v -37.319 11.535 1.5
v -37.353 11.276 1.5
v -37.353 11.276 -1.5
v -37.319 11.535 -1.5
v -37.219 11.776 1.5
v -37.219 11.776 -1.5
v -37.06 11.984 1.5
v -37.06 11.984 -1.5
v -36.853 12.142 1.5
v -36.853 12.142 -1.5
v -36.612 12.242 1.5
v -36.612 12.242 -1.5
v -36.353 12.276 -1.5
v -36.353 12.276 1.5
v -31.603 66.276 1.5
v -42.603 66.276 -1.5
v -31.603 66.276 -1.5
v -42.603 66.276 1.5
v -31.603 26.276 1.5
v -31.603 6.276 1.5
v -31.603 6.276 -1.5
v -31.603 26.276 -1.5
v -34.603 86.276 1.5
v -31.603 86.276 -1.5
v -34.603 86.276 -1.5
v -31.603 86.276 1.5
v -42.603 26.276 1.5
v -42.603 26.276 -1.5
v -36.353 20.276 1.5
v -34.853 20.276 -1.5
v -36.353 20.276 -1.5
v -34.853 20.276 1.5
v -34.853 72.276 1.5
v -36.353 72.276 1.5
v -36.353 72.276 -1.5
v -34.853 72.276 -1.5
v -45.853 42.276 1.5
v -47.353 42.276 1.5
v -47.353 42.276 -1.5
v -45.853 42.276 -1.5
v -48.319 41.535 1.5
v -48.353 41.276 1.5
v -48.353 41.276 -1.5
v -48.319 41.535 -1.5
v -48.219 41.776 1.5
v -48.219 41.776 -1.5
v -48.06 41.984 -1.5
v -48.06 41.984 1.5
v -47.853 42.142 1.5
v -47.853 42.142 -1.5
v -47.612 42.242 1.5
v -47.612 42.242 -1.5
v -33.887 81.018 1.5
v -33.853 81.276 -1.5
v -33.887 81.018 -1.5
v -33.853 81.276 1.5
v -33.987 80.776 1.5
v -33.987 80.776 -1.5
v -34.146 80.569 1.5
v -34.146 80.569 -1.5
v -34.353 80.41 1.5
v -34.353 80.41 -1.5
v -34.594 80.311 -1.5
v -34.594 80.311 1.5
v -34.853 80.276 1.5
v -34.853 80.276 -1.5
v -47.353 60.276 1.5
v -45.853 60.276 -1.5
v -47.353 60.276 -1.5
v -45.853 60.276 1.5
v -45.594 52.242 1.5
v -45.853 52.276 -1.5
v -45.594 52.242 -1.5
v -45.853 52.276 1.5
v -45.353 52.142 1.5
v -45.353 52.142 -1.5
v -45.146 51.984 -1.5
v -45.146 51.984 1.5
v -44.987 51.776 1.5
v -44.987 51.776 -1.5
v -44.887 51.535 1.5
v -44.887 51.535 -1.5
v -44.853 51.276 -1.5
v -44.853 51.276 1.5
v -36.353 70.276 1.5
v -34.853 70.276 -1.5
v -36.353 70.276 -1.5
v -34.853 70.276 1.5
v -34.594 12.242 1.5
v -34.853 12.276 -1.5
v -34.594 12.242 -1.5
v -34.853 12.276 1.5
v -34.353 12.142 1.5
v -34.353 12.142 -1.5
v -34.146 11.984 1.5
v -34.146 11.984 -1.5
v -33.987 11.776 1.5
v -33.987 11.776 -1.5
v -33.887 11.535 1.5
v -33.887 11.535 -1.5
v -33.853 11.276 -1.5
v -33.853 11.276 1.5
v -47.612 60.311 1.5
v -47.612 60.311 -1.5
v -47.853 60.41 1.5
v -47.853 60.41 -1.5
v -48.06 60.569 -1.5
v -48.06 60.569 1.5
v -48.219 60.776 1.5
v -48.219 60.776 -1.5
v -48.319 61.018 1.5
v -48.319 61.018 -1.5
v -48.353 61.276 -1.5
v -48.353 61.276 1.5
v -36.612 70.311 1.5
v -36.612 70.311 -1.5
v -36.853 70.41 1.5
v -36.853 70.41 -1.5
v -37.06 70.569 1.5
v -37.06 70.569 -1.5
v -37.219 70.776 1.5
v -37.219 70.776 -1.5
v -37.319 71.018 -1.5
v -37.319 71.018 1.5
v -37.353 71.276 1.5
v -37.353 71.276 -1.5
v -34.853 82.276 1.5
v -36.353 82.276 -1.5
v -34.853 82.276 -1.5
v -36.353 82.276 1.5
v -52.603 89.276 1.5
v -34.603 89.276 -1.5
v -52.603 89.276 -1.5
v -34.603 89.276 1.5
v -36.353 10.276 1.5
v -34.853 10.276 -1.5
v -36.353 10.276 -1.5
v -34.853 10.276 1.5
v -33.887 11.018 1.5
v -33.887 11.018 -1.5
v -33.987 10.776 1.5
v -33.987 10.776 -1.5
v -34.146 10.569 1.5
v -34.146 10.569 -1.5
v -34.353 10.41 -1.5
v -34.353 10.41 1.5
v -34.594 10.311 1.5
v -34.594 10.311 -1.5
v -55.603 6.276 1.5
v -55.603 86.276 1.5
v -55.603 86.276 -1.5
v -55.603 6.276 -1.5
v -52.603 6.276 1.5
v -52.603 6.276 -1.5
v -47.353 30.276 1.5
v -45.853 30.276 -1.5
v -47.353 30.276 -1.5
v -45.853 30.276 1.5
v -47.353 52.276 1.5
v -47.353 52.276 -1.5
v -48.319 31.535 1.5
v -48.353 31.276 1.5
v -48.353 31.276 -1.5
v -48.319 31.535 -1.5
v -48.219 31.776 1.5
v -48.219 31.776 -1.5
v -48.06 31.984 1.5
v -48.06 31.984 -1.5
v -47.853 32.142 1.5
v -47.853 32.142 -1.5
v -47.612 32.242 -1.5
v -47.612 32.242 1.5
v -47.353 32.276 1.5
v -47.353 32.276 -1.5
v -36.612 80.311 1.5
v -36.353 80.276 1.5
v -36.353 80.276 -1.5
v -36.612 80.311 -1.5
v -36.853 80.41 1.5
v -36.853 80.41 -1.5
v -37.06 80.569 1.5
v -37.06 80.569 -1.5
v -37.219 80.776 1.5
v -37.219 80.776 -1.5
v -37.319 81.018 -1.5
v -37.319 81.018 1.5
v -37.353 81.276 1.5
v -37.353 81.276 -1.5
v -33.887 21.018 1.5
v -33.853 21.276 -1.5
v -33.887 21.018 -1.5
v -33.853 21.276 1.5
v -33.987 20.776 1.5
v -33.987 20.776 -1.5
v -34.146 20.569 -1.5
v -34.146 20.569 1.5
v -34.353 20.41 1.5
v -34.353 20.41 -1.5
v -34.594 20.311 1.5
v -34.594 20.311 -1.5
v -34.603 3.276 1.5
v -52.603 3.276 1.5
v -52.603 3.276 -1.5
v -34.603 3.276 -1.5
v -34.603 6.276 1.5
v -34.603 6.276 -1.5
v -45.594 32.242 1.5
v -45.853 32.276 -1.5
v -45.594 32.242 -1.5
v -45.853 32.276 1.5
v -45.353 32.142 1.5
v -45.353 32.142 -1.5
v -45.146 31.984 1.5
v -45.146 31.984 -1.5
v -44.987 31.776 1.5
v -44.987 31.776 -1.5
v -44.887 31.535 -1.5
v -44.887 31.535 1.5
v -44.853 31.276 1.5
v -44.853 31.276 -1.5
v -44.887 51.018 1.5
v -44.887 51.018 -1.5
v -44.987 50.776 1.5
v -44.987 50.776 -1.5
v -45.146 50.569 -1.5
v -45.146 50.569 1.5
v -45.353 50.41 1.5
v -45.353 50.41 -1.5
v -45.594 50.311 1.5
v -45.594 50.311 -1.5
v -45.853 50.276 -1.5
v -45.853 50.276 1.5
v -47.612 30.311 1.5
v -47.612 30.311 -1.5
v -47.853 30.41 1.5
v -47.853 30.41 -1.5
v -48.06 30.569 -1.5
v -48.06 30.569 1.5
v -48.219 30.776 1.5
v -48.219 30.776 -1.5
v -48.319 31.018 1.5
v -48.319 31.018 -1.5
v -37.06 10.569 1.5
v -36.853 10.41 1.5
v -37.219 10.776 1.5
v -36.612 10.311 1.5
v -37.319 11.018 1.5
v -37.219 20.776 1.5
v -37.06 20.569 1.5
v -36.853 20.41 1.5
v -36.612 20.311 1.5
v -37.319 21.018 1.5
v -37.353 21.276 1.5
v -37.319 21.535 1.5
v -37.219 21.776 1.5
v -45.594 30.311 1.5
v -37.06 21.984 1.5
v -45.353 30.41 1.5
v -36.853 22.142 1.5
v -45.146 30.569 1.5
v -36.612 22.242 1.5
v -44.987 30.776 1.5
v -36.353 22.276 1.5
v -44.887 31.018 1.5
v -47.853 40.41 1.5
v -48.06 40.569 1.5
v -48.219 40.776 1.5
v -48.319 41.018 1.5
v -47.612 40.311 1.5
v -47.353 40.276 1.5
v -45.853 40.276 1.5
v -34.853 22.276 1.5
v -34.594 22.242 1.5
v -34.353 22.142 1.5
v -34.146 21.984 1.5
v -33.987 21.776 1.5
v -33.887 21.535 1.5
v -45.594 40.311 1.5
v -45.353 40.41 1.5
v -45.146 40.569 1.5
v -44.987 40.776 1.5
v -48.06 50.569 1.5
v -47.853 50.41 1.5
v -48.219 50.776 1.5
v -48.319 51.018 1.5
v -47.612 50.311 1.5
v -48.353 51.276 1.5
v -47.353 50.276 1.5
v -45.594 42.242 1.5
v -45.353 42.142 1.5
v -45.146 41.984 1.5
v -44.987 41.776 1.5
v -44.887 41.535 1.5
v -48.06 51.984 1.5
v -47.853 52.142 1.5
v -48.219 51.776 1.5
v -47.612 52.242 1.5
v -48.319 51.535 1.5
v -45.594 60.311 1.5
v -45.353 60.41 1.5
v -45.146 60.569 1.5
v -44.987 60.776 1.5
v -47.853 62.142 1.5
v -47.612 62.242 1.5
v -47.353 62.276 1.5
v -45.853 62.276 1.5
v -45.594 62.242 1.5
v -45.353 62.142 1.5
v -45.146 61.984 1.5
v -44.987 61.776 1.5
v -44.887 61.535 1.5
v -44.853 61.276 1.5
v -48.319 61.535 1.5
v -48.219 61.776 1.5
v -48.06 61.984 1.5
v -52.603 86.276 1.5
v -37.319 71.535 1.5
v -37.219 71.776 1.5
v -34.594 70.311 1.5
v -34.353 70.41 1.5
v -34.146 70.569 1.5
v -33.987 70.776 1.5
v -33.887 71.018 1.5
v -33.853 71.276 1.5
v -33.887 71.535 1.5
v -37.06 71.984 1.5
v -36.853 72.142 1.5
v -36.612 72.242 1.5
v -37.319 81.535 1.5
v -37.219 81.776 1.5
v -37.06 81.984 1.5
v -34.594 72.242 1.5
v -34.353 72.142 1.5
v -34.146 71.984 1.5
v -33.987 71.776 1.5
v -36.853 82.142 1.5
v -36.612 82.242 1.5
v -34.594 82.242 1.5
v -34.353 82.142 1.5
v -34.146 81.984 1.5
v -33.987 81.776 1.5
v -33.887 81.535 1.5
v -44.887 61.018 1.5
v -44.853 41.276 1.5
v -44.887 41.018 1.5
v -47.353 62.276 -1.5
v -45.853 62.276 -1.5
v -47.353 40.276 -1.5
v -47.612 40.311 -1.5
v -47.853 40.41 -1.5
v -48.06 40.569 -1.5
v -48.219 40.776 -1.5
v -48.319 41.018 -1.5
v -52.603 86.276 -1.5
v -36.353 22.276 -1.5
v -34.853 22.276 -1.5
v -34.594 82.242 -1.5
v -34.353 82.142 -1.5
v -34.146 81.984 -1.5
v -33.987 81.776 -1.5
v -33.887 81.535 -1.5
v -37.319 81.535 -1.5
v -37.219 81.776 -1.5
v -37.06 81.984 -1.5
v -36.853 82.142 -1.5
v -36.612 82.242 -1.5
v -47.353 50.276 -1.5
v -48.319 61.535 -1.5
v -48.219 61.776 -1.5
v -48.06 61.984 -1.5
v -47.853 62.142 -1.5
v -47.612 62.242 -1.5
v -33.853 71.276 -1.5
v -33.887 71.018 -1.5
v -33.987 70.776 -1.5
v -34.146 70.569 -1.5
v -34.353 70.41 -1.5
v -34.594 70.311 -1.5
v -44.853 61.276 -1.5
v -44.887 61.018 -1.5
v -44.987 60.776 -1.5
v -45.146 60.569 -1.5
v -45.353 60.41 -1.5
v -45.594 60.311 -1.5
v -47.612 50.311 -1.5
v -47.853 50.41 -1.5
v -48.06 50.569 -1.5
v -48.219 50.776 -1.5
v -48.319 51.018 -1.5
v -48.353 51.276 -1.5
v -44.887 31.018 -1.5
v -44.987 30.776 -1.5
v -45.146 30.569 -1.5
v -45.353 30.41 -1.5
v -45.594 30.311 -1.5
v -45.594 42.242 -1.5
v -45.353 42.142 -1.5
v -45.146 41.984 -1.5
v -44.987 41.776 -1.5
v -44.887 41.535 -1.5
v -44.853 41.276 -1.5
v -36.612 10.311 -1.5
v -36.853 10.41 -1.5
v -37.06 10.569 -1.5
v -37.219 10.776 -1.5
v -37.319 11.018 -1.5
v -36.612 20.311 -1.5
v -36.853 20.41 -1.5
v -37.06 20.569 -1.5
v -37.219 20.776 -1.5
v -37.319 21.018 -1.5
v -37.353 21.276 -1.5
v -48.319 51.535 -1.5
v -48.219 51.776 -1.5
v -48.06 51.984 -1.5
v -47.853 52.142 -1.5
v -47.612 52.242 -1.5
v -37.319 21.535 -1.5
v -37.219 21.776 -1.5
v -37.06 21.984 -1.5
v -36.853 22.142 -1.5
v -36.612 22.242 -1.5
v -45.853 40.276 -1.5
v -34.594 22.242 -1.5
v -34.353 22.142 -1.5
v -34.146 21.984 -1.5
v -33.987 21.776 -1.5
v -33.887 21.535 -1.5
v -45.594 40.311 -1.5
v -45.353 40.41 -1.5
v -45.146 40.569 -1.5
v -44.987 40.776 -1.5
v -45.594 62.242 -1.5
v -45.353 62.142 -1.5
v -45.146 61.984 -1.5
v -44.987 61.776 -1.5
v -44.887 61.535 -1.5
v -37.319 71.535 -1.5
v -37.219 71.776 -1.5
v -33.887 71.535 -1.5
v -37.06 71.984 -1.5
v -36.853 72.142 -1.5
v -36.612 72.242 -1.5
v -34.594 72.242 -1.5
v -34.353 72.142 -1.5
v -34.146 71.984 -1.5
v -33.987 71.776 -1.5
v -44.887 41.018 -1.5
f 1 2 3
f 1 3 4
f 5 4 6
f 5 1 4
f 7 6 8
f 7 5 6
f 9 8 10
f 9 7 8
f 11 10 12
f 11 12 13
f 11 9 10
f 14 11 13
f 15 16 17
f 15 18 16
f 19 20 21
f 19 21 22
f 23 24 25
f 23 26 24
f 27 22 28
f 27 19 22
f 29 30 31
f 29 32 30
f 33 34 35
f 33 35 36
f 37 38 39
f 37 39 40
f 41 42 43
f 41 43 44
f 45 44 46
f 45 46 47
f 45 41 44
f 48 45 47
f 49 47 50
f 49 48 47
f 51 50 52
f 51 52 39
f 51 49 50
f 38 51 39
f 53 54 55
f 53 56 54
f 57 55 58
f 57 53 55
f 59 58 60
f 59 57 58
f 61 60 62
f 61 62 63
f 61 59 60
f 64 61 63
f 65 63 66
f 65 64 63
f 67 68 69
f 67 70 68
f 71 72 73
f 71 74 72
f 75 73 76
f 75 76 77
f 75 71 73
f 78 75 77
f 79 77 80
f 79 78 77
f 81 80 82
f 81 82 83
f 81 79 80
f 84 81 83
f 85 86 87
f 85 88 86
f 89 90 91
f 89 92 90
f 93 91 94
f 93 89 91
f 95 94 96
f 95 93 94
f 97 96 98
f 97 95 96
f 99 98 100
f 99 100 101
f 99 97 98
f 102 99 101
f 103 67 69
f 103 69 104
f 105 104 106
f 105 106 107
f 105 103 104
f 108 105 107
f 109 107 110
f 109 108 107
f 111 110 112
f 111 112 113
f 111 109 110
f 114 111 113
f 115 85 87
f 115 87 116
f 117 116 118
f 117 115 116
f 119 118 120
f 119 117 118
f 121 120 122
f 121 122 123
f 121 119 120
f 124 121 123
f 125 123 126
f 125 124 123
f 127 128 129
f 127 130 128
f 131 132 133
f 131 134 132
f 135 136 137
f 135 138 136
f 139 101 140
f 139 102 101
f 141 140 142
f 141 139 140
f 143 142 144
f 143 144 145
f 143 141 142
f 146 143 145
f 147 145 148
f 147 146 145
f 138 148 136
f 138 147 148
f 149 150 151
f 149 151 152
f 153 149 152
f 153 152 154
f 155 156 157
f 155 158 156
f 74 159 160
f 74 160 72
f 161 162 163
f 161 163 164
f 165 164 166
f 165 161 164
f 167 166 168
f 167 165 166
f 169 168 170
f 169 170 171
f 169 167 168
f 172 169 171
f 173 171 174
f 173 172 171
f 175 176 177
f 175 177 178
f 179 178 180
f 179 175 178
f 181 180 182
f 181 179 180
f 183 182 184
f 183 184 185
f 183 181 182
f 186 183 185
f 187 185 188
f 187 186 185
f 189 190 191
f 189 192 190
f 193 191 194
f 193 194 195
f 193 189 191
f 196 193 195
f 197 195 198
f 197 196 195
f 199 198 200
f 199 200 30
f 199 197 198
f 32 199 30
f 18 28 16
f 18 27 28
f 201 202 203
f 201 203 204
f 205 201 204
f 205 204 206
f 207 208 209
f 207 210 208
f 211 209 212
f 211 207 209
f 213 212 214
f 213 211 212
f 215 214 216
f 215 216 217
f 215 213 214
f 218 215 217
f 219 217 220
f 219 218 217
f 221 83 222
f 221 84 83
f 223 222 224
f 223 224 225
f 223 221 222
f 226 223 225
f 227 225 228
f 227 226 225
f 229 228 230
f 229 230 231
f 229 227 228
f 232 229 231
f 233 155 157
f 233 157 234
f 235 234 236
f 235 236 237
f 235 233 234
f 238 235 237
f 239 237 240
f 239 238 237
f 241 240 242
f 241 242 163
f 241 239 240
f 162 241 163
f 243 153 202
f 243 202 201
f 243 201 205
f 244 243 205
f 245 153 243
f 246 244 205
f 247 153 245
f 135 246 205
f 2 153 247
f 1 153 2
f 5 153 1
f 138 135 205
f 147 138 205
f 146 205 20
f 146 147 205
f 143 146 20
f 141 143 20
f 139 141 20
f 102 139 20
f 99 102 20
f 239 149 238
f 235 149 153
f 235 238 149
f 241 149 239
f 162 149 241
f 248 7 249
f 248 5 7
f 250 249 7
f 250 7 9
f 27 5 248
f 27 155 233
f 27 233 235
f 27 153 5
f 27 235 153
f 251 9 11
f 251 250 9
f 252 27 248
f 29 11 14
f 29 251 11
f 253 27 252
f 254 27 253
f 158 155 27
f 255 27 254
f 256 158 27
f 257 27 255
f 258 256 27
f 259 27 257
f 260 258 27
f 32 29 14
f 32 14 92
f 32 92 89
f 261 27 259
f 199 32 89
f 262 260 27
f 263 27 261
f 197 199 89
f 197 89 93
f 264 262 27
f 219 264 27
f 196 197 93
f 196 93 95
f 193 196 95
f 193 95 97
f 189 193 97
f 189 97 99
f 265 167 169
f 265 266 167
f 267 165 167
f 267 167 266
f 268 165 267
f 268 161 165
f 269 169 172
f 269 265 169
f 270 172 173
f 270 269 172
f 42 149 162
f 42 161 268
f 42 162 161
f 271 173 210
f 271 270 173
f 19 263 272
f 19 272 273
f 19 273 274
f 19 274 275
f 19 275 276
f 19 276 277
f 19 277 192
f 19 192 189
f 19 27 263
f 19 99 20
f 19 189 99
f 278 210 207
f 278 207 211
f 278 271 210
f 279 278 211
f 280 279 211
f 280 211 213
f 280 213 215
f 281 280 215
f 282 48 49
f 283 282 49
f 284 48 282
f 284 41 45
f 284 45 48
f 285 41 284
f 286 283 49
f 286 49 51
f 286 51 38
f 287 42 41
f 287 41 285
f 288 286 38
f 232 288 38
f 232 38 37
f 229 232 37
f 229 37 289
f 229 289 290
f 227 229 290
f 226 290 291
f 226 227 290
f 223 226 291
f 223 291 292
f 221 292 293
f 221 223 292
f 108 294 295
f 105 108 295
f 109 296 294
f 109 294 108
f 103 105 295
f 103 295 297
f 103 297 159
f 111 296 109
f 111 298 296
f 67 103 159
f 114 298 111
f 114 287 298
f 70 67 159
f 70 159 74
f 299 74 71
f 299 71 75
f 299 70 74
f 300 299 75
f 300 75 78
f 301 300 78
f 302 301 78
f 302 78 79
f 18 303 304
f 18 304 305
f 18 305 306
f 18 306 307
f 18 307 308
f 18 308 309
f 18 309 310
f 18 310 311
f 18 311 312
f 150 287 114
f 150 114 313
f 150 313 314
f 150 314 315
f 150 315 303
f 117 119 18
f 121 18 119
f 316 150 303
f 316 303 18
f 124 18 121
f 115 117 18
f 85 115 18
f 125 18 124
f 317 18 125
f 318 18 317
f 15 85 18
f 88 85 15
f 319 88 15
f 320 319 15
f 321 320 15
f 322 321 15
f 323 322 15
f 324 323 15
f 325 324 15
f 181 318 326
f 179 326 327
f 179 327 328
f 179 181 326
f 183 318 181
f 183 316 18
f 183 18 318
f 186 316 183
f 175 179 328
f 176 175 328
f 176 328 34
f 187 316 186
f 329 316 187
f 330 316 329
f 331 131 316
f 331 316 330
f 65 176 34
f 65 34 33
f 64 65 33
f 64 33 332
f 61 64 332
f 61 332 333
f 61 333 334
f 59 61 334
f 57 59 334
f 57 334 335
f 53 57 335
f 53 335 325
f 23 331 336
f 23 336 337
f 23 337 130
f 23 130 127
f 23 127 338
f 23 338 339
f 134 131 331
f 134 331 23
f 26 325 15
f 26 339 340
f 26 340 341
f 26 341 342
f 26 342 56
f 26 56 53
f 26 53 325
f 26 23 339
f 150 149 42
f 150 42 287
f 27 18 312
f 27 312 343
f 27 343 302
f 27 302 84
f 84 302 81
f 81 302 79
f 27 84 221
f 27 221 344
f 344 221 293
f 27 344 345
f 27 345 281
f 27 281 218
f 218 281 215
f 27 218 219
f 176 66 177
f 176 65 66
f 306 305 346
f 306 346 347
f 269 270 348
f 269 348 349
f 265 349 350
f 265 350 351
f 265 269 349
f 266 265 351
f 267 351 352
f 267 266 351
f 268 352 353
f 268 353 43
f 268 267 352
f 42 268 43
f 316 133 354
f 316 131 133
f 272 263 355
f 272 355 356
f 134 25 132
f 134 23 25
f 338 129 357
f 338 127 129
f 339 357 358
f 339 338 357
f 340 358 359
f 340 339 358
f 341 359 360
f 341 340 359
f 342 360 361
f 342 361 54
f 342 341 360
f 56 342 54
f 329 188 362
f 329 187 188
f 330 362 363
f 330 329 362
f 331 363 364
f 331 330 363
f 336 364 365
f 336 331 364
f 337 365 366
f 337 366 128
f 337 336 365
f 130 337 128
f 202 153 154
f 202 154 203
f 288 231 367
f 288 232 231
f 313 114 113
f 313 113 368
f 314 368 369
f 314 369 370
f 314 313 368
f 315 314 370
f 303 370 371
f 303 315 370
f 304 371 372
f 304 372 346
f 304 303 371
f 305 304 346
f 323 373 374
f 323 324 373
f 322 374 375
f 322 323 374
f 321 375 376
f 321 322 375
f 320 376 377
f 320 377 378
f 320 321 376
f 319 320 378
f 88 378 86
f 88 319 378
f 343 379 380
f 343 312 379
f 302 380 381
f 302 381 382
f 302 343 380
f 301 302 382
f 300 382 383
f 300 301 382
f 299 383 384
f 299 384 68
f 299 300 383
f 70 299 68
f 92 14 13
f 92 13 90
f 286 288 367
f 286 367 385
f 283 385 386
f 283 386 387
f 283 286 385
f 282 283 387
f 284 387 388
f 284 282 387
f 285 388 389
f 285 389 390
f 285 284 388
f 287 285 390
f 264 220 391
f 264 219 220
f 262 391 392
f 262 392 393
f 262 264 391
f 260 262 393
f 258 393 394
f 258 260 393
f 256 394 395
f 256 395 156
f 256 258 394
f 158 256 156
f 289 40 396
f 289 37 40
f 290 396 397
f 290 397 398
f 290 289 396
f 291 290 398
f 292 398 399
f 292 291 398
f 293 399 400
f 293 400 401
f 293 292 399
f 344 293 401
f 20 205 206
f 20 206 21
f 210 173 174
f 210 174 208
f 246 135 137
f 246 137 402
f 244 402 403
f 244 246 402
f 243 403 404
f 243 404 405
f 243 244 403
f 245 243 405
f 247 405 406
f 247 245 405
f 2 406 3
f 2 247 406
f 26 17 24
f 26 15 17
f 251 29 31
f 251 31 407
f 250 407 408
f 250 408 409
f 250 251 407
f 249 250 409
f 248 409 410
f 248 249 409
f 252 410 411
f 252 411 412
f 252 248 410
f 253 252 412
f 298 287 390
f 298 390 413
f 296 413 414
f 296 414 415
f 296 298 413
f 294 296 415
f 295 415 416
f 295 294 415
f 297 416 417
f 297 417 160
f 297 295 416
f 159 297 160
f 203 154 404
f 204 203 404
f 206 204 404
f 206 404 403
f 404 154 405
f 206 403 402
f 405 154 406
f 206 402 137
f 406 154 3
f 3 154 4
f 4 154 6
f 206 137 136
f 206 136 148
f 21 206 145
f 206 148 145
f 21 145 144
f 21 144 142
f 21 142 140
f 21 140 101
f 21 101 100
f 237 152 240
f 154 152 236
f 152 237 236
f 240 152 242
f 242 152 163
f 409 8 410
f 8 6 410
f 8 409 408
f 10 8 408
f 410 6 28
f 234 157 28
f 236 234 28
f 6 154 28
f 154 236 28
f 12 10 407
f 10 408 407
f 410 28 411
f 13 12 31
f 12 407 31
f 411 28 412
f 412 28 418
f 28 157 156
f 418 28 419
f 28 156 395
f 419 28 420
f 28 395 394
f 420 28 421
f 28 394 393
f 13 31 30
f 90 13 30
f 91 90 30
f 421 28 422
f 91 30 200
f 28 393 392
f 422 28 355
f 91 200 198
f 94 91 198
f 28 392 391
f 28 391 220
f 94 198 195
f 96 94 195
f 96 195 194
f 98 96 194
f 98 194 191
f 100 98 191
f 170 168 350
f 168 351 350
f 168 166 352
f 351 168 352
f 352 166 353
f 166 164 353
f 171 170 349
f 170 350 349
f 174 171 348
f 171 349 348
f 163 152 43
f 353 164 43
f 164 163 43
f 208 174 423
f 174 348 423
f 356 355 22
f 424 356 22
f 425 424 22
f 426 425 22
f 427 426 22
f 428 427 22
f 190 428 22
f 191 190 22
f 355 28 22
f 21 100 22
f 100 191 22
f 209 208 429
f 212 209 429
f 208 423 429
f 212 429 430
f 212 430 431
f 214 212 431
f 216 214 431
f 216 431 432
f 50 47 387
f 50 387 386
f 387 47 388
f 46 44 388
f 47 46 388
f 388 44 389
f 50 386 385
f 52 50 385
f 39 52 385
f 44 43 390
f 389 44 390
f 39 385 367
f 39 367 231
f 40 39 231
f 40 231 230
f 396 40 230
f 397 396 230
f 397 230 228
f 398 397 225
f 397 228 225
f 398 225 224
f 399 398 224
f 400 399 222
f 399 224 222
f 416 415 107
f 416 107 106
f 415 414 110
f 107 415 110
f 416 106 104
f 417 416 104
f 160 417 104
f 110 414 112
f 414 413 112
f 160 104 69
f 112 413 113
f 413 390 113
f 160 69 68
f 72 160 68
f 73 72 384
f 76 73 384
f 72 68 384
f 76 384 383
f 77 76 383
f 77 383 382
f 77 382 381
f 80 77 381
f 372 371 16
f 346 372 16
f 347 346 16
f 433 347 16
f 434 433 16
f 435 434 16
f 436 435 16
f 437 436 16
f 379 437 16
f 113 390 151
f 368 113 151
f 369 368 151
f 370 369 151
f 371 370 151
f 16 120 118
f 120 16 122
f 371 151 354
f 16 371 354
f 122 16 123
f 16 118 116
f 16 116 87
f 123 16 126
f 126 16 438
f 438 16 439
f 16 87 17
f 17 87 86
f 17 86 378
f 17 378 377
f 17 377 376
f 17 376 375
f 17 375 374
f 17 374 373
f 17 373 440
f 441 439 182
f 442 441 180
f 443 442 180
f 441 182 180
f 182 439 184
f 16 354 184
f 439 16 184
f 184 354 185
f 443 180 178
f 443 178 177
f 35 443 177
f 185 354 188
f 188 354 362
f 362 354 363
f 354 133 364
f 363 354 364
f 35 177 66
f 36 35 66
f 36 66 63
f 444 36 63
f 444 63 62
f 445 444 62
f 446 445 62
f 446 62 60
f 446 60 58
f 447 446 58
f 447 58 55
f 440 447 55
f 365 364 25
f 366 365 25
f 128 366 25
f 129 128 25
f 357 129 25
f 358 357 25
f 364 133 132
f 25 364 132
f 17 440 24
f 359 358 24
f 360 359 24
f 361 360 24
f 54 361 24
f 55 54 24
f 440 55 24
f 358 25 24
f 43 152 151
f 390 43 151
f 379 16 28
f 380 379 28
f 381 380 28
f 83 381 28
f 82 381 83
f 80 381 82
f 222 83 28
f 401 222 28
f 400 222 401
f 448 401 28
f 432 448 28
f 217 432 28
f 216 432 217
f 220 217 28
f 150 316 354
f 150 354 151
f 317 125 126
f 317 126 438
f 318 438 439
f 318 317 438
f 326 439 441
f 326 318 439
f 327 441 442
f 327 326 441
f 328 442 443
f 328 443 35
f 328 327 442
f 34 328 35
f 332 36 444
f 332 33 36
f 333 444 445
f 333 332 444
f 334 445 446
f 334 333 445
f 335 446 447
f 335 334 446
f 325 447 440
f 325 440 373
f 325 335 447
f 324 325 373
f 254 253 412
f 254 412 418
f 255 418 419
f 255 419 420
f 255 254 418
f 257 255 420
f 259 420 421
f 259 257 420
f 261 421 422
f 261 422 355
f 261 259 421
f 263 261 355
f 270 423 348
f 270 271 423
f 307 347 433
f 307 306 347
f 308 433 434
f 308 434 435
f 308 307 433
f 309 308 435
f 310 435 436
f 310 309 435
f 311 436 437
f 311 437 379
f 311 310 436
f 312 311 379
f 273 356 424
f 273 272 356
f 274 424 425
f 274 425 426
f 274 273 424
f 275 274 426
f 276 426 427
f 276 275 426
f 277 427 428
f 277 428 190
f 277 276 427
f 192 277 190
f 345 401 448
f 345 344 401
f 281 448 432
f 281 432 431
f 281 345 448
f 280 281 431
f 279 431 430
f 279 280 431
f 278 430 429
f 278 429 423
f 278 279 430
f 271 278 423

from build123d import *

# Parameters (mm, degrees)
F1_DEPTH = 1.5


with BuildPart() as f1:
    # F0 (on Top) → F1 (new body, symmetric)
    with BuildSketch(Plane.XY):
        Polygon((-52.603185, 89.276404), (-52.603174, 86.276474), (-55.603174, 86.276415), (-55.603174, 6.276474), (-52.603185, 6.276474), (-52.603185, 3.276485), (-34.603174, 3.276474), (-34.603174, 6.276474), (-31.603174, 6.276474), (-31.603174, 26.276474), (-42.603279, 26.276459), (-42.603279, 66.27643), (-31.603261, 66.27643), (-31.603261, 86.276415), (-34.603174, 86.276474), (-34.60325, 89.276404), align=None)
        with BuildLine():
            ThreePointArc((-47.353174, 30.276474), (-48.060281, 30.569367), (-48.353174, 31.276474))
            ThreePointArc((-48.353174, 31.276474), (-48.060281, 31.983581), (-47.353174, 32.276474))
            Line((-47.353174, 32.276474), (-45.853174, 32.276474))
            ThreePointArc((-45.853174, 32.276474), (-45.146067, 31.983581), (-44.853174, 31.276474))
            ThreePointArc((-44.853174, 31.276474), (-45.146067, 30.569367), (-45.853174, 30.276474))
            Line((-45.853174, 30.276474), (-47.353174, 30.276474))
        make_face(mode=Mode.SUBTRACT)
        with BuildLine():
            ThreePointArc((-47.353174, 40.276474), (-48.060281, 40.569367), (-48.353174, 41.276474))
            ThreePointArc((-48.353174, 41.276474), (-48.060281, 41.983581), (-47.353174, 42.276474))
            Line((-47.353174, 42.276474), (-45.853174, 42.276474))
            ThreePointArc((-45.853174, 42.276474), (-45.146067, 41.983581), (-44.853174, 41.276474))
            ThreePointArc((-44.853174, 41.276474), (-45.146067, 40.569367), (-45.853174, 40.276474))
            Line((-45.853174, 40.276474), (-47.353174, 40.276474))
        make_face(mode=Mode.SUBTRACT)
        with BuildLine():
            ThreePointArc((-36.353174, 10.276474), (-37.060281, 10.569367), (-37.353174, 11.276474))
            ThreePointArc((-37.353174, 11.276474), (-37.060281, 11.983581), (-36.353174, 12.276474))
            Line((-36.353174, 12.276474), (-34.853174, 12.276474))
            ThreePointArc((-34.853174, 12.276474), (-34.146067, 11.983581), (-33.853174, 11.276474))
            ThreePointArc((-33.853174, 11.276474), (-34.146067, 10.569367), (-34.853174, 10.276474))
            Line((-34.853174, 10.276474), (-36.353174, 10.276474))
        make_face(mode=Mode.SUBTRACT)
        with BuildLine():
            ThreePointArc((-36.353174, 20.276474), (-37.060281, 20.569367), (-37.353174, 21.276474))
            ThreePointArc((-37.353174, 21.276474), (-37.060281, 21.983581), (-36.353174, 22.276474))
            Line((-36.353174, 22.276474), (-34.853174, 22.276474))
            ThreePointArc((-34.853174, 22.276474), (-34.146067, 21.983581), (-33.853174, 21.276474))
            ThreePointArc((-33.853174, 21.276474), (-34.146067, 20.569367), (-34.853174, 20.276474))
            Line((-34.853174, 20.276474), (-36.353174, 20.276474))
        make_face(mode=Mode.SUBTRACT)
        with BuildLine():
            ThreePointArc((-47.353174, 50.276474), (-48.060281, 50.569367), (-48.353174, 51.276474))
            ThreePointArc((-48.353174, 51.276474), (-48.060281, 51.983581), (-47.353174, 52.276474))
            Line((-47.353174, 52.276474), (-45.853174, 52.276474))
            ThreePointArc((-45.853174, 52.276474), (-45.146067, 51.983581), (-44.853174, 51.276474))
            ThreePointArc((-44.853174, 51.276474), (-45.146067, 50.569367), (-45.853174, 50.276474))
            Line((-45.853174, 50.276474), (-47.353174, 50.276474))
        make_face(mode=Mode.SUBTRACT)
        with BuildLine():
            ThreePointArc((-47.353174, 60.276474), (-48.060281, 60.569367), (-48.353174, 61.276474))
            ThreePointArc((-48.353174, 61.276474), (-48.060281, 61.983581), (-47.353174, 62.276474))
            Line((-47.353174, 62.276474), (-45.853174, 62.276474))
            ThreePointArc((-45.853174, 62.276474), (-45.146067, 61.983581), (-44.853174, 61.276474))
            ThreePointArc((-44.853174, 61.276474), (-45.146067, 60.569367), (-45.853174, 60.276474))
            Line((-45.853174, 60.276474), (-47.353174, 60.276474))
        make_face(mode=Mode.SUBTRACT)
        with BuildLine():
            ThreePointArc((-36.353174, 70.276474), (-37.060281, 70.569367), (-37.353174, 71.276474))
            ThreePointArc((-37.353174, 71.276474), (-37.060281, 71.983581), (-36.353174, 72.276474))
            Line((-36.353174, 72.276474), (-34.853174, 72.276474))
            ThreePointArc((-34.853174, 72.276474), (-34.146067, 71.983581), (-33.853174, 71.276474))
            ThreePointArc((-33.853174, 71.276474), (-34.146067, 70.569367), (-34.853174, 70.276474))
            Line((-34.853174, 70.276474), (-36.353174, 70.276474))
        make_face(mode=Mode.SUBTRACT)
        with BuildLine():
            ThreePointArc((-36.353174, 80.276474), (-37.060281, 80.569367), (-37.353174, 81.276474))
            ThreePointArc((-37.353174, 81.276474), (-37.060281, 81.983581), (-36.353174, 82.276474))
            Line((-36.353174, 82.276474), (-34.853174, 82.276474))
            ThreePointArc((-34.853174, 82.276474), (-34.146067, 81.983581), (-33.853174, 81.276474))
            ThreePointArc((-33.853174, 81.276474), (-34.146067, 80.569367), (-34.853174, 80.276474))
            Line((-34.853174, 80.276474), (-36.353174, 80.276474))
        make_face(mode=Mode.SUBTRACT)
    extrude(amount=F1_DEPTH, both=True)


solid = f1.part
